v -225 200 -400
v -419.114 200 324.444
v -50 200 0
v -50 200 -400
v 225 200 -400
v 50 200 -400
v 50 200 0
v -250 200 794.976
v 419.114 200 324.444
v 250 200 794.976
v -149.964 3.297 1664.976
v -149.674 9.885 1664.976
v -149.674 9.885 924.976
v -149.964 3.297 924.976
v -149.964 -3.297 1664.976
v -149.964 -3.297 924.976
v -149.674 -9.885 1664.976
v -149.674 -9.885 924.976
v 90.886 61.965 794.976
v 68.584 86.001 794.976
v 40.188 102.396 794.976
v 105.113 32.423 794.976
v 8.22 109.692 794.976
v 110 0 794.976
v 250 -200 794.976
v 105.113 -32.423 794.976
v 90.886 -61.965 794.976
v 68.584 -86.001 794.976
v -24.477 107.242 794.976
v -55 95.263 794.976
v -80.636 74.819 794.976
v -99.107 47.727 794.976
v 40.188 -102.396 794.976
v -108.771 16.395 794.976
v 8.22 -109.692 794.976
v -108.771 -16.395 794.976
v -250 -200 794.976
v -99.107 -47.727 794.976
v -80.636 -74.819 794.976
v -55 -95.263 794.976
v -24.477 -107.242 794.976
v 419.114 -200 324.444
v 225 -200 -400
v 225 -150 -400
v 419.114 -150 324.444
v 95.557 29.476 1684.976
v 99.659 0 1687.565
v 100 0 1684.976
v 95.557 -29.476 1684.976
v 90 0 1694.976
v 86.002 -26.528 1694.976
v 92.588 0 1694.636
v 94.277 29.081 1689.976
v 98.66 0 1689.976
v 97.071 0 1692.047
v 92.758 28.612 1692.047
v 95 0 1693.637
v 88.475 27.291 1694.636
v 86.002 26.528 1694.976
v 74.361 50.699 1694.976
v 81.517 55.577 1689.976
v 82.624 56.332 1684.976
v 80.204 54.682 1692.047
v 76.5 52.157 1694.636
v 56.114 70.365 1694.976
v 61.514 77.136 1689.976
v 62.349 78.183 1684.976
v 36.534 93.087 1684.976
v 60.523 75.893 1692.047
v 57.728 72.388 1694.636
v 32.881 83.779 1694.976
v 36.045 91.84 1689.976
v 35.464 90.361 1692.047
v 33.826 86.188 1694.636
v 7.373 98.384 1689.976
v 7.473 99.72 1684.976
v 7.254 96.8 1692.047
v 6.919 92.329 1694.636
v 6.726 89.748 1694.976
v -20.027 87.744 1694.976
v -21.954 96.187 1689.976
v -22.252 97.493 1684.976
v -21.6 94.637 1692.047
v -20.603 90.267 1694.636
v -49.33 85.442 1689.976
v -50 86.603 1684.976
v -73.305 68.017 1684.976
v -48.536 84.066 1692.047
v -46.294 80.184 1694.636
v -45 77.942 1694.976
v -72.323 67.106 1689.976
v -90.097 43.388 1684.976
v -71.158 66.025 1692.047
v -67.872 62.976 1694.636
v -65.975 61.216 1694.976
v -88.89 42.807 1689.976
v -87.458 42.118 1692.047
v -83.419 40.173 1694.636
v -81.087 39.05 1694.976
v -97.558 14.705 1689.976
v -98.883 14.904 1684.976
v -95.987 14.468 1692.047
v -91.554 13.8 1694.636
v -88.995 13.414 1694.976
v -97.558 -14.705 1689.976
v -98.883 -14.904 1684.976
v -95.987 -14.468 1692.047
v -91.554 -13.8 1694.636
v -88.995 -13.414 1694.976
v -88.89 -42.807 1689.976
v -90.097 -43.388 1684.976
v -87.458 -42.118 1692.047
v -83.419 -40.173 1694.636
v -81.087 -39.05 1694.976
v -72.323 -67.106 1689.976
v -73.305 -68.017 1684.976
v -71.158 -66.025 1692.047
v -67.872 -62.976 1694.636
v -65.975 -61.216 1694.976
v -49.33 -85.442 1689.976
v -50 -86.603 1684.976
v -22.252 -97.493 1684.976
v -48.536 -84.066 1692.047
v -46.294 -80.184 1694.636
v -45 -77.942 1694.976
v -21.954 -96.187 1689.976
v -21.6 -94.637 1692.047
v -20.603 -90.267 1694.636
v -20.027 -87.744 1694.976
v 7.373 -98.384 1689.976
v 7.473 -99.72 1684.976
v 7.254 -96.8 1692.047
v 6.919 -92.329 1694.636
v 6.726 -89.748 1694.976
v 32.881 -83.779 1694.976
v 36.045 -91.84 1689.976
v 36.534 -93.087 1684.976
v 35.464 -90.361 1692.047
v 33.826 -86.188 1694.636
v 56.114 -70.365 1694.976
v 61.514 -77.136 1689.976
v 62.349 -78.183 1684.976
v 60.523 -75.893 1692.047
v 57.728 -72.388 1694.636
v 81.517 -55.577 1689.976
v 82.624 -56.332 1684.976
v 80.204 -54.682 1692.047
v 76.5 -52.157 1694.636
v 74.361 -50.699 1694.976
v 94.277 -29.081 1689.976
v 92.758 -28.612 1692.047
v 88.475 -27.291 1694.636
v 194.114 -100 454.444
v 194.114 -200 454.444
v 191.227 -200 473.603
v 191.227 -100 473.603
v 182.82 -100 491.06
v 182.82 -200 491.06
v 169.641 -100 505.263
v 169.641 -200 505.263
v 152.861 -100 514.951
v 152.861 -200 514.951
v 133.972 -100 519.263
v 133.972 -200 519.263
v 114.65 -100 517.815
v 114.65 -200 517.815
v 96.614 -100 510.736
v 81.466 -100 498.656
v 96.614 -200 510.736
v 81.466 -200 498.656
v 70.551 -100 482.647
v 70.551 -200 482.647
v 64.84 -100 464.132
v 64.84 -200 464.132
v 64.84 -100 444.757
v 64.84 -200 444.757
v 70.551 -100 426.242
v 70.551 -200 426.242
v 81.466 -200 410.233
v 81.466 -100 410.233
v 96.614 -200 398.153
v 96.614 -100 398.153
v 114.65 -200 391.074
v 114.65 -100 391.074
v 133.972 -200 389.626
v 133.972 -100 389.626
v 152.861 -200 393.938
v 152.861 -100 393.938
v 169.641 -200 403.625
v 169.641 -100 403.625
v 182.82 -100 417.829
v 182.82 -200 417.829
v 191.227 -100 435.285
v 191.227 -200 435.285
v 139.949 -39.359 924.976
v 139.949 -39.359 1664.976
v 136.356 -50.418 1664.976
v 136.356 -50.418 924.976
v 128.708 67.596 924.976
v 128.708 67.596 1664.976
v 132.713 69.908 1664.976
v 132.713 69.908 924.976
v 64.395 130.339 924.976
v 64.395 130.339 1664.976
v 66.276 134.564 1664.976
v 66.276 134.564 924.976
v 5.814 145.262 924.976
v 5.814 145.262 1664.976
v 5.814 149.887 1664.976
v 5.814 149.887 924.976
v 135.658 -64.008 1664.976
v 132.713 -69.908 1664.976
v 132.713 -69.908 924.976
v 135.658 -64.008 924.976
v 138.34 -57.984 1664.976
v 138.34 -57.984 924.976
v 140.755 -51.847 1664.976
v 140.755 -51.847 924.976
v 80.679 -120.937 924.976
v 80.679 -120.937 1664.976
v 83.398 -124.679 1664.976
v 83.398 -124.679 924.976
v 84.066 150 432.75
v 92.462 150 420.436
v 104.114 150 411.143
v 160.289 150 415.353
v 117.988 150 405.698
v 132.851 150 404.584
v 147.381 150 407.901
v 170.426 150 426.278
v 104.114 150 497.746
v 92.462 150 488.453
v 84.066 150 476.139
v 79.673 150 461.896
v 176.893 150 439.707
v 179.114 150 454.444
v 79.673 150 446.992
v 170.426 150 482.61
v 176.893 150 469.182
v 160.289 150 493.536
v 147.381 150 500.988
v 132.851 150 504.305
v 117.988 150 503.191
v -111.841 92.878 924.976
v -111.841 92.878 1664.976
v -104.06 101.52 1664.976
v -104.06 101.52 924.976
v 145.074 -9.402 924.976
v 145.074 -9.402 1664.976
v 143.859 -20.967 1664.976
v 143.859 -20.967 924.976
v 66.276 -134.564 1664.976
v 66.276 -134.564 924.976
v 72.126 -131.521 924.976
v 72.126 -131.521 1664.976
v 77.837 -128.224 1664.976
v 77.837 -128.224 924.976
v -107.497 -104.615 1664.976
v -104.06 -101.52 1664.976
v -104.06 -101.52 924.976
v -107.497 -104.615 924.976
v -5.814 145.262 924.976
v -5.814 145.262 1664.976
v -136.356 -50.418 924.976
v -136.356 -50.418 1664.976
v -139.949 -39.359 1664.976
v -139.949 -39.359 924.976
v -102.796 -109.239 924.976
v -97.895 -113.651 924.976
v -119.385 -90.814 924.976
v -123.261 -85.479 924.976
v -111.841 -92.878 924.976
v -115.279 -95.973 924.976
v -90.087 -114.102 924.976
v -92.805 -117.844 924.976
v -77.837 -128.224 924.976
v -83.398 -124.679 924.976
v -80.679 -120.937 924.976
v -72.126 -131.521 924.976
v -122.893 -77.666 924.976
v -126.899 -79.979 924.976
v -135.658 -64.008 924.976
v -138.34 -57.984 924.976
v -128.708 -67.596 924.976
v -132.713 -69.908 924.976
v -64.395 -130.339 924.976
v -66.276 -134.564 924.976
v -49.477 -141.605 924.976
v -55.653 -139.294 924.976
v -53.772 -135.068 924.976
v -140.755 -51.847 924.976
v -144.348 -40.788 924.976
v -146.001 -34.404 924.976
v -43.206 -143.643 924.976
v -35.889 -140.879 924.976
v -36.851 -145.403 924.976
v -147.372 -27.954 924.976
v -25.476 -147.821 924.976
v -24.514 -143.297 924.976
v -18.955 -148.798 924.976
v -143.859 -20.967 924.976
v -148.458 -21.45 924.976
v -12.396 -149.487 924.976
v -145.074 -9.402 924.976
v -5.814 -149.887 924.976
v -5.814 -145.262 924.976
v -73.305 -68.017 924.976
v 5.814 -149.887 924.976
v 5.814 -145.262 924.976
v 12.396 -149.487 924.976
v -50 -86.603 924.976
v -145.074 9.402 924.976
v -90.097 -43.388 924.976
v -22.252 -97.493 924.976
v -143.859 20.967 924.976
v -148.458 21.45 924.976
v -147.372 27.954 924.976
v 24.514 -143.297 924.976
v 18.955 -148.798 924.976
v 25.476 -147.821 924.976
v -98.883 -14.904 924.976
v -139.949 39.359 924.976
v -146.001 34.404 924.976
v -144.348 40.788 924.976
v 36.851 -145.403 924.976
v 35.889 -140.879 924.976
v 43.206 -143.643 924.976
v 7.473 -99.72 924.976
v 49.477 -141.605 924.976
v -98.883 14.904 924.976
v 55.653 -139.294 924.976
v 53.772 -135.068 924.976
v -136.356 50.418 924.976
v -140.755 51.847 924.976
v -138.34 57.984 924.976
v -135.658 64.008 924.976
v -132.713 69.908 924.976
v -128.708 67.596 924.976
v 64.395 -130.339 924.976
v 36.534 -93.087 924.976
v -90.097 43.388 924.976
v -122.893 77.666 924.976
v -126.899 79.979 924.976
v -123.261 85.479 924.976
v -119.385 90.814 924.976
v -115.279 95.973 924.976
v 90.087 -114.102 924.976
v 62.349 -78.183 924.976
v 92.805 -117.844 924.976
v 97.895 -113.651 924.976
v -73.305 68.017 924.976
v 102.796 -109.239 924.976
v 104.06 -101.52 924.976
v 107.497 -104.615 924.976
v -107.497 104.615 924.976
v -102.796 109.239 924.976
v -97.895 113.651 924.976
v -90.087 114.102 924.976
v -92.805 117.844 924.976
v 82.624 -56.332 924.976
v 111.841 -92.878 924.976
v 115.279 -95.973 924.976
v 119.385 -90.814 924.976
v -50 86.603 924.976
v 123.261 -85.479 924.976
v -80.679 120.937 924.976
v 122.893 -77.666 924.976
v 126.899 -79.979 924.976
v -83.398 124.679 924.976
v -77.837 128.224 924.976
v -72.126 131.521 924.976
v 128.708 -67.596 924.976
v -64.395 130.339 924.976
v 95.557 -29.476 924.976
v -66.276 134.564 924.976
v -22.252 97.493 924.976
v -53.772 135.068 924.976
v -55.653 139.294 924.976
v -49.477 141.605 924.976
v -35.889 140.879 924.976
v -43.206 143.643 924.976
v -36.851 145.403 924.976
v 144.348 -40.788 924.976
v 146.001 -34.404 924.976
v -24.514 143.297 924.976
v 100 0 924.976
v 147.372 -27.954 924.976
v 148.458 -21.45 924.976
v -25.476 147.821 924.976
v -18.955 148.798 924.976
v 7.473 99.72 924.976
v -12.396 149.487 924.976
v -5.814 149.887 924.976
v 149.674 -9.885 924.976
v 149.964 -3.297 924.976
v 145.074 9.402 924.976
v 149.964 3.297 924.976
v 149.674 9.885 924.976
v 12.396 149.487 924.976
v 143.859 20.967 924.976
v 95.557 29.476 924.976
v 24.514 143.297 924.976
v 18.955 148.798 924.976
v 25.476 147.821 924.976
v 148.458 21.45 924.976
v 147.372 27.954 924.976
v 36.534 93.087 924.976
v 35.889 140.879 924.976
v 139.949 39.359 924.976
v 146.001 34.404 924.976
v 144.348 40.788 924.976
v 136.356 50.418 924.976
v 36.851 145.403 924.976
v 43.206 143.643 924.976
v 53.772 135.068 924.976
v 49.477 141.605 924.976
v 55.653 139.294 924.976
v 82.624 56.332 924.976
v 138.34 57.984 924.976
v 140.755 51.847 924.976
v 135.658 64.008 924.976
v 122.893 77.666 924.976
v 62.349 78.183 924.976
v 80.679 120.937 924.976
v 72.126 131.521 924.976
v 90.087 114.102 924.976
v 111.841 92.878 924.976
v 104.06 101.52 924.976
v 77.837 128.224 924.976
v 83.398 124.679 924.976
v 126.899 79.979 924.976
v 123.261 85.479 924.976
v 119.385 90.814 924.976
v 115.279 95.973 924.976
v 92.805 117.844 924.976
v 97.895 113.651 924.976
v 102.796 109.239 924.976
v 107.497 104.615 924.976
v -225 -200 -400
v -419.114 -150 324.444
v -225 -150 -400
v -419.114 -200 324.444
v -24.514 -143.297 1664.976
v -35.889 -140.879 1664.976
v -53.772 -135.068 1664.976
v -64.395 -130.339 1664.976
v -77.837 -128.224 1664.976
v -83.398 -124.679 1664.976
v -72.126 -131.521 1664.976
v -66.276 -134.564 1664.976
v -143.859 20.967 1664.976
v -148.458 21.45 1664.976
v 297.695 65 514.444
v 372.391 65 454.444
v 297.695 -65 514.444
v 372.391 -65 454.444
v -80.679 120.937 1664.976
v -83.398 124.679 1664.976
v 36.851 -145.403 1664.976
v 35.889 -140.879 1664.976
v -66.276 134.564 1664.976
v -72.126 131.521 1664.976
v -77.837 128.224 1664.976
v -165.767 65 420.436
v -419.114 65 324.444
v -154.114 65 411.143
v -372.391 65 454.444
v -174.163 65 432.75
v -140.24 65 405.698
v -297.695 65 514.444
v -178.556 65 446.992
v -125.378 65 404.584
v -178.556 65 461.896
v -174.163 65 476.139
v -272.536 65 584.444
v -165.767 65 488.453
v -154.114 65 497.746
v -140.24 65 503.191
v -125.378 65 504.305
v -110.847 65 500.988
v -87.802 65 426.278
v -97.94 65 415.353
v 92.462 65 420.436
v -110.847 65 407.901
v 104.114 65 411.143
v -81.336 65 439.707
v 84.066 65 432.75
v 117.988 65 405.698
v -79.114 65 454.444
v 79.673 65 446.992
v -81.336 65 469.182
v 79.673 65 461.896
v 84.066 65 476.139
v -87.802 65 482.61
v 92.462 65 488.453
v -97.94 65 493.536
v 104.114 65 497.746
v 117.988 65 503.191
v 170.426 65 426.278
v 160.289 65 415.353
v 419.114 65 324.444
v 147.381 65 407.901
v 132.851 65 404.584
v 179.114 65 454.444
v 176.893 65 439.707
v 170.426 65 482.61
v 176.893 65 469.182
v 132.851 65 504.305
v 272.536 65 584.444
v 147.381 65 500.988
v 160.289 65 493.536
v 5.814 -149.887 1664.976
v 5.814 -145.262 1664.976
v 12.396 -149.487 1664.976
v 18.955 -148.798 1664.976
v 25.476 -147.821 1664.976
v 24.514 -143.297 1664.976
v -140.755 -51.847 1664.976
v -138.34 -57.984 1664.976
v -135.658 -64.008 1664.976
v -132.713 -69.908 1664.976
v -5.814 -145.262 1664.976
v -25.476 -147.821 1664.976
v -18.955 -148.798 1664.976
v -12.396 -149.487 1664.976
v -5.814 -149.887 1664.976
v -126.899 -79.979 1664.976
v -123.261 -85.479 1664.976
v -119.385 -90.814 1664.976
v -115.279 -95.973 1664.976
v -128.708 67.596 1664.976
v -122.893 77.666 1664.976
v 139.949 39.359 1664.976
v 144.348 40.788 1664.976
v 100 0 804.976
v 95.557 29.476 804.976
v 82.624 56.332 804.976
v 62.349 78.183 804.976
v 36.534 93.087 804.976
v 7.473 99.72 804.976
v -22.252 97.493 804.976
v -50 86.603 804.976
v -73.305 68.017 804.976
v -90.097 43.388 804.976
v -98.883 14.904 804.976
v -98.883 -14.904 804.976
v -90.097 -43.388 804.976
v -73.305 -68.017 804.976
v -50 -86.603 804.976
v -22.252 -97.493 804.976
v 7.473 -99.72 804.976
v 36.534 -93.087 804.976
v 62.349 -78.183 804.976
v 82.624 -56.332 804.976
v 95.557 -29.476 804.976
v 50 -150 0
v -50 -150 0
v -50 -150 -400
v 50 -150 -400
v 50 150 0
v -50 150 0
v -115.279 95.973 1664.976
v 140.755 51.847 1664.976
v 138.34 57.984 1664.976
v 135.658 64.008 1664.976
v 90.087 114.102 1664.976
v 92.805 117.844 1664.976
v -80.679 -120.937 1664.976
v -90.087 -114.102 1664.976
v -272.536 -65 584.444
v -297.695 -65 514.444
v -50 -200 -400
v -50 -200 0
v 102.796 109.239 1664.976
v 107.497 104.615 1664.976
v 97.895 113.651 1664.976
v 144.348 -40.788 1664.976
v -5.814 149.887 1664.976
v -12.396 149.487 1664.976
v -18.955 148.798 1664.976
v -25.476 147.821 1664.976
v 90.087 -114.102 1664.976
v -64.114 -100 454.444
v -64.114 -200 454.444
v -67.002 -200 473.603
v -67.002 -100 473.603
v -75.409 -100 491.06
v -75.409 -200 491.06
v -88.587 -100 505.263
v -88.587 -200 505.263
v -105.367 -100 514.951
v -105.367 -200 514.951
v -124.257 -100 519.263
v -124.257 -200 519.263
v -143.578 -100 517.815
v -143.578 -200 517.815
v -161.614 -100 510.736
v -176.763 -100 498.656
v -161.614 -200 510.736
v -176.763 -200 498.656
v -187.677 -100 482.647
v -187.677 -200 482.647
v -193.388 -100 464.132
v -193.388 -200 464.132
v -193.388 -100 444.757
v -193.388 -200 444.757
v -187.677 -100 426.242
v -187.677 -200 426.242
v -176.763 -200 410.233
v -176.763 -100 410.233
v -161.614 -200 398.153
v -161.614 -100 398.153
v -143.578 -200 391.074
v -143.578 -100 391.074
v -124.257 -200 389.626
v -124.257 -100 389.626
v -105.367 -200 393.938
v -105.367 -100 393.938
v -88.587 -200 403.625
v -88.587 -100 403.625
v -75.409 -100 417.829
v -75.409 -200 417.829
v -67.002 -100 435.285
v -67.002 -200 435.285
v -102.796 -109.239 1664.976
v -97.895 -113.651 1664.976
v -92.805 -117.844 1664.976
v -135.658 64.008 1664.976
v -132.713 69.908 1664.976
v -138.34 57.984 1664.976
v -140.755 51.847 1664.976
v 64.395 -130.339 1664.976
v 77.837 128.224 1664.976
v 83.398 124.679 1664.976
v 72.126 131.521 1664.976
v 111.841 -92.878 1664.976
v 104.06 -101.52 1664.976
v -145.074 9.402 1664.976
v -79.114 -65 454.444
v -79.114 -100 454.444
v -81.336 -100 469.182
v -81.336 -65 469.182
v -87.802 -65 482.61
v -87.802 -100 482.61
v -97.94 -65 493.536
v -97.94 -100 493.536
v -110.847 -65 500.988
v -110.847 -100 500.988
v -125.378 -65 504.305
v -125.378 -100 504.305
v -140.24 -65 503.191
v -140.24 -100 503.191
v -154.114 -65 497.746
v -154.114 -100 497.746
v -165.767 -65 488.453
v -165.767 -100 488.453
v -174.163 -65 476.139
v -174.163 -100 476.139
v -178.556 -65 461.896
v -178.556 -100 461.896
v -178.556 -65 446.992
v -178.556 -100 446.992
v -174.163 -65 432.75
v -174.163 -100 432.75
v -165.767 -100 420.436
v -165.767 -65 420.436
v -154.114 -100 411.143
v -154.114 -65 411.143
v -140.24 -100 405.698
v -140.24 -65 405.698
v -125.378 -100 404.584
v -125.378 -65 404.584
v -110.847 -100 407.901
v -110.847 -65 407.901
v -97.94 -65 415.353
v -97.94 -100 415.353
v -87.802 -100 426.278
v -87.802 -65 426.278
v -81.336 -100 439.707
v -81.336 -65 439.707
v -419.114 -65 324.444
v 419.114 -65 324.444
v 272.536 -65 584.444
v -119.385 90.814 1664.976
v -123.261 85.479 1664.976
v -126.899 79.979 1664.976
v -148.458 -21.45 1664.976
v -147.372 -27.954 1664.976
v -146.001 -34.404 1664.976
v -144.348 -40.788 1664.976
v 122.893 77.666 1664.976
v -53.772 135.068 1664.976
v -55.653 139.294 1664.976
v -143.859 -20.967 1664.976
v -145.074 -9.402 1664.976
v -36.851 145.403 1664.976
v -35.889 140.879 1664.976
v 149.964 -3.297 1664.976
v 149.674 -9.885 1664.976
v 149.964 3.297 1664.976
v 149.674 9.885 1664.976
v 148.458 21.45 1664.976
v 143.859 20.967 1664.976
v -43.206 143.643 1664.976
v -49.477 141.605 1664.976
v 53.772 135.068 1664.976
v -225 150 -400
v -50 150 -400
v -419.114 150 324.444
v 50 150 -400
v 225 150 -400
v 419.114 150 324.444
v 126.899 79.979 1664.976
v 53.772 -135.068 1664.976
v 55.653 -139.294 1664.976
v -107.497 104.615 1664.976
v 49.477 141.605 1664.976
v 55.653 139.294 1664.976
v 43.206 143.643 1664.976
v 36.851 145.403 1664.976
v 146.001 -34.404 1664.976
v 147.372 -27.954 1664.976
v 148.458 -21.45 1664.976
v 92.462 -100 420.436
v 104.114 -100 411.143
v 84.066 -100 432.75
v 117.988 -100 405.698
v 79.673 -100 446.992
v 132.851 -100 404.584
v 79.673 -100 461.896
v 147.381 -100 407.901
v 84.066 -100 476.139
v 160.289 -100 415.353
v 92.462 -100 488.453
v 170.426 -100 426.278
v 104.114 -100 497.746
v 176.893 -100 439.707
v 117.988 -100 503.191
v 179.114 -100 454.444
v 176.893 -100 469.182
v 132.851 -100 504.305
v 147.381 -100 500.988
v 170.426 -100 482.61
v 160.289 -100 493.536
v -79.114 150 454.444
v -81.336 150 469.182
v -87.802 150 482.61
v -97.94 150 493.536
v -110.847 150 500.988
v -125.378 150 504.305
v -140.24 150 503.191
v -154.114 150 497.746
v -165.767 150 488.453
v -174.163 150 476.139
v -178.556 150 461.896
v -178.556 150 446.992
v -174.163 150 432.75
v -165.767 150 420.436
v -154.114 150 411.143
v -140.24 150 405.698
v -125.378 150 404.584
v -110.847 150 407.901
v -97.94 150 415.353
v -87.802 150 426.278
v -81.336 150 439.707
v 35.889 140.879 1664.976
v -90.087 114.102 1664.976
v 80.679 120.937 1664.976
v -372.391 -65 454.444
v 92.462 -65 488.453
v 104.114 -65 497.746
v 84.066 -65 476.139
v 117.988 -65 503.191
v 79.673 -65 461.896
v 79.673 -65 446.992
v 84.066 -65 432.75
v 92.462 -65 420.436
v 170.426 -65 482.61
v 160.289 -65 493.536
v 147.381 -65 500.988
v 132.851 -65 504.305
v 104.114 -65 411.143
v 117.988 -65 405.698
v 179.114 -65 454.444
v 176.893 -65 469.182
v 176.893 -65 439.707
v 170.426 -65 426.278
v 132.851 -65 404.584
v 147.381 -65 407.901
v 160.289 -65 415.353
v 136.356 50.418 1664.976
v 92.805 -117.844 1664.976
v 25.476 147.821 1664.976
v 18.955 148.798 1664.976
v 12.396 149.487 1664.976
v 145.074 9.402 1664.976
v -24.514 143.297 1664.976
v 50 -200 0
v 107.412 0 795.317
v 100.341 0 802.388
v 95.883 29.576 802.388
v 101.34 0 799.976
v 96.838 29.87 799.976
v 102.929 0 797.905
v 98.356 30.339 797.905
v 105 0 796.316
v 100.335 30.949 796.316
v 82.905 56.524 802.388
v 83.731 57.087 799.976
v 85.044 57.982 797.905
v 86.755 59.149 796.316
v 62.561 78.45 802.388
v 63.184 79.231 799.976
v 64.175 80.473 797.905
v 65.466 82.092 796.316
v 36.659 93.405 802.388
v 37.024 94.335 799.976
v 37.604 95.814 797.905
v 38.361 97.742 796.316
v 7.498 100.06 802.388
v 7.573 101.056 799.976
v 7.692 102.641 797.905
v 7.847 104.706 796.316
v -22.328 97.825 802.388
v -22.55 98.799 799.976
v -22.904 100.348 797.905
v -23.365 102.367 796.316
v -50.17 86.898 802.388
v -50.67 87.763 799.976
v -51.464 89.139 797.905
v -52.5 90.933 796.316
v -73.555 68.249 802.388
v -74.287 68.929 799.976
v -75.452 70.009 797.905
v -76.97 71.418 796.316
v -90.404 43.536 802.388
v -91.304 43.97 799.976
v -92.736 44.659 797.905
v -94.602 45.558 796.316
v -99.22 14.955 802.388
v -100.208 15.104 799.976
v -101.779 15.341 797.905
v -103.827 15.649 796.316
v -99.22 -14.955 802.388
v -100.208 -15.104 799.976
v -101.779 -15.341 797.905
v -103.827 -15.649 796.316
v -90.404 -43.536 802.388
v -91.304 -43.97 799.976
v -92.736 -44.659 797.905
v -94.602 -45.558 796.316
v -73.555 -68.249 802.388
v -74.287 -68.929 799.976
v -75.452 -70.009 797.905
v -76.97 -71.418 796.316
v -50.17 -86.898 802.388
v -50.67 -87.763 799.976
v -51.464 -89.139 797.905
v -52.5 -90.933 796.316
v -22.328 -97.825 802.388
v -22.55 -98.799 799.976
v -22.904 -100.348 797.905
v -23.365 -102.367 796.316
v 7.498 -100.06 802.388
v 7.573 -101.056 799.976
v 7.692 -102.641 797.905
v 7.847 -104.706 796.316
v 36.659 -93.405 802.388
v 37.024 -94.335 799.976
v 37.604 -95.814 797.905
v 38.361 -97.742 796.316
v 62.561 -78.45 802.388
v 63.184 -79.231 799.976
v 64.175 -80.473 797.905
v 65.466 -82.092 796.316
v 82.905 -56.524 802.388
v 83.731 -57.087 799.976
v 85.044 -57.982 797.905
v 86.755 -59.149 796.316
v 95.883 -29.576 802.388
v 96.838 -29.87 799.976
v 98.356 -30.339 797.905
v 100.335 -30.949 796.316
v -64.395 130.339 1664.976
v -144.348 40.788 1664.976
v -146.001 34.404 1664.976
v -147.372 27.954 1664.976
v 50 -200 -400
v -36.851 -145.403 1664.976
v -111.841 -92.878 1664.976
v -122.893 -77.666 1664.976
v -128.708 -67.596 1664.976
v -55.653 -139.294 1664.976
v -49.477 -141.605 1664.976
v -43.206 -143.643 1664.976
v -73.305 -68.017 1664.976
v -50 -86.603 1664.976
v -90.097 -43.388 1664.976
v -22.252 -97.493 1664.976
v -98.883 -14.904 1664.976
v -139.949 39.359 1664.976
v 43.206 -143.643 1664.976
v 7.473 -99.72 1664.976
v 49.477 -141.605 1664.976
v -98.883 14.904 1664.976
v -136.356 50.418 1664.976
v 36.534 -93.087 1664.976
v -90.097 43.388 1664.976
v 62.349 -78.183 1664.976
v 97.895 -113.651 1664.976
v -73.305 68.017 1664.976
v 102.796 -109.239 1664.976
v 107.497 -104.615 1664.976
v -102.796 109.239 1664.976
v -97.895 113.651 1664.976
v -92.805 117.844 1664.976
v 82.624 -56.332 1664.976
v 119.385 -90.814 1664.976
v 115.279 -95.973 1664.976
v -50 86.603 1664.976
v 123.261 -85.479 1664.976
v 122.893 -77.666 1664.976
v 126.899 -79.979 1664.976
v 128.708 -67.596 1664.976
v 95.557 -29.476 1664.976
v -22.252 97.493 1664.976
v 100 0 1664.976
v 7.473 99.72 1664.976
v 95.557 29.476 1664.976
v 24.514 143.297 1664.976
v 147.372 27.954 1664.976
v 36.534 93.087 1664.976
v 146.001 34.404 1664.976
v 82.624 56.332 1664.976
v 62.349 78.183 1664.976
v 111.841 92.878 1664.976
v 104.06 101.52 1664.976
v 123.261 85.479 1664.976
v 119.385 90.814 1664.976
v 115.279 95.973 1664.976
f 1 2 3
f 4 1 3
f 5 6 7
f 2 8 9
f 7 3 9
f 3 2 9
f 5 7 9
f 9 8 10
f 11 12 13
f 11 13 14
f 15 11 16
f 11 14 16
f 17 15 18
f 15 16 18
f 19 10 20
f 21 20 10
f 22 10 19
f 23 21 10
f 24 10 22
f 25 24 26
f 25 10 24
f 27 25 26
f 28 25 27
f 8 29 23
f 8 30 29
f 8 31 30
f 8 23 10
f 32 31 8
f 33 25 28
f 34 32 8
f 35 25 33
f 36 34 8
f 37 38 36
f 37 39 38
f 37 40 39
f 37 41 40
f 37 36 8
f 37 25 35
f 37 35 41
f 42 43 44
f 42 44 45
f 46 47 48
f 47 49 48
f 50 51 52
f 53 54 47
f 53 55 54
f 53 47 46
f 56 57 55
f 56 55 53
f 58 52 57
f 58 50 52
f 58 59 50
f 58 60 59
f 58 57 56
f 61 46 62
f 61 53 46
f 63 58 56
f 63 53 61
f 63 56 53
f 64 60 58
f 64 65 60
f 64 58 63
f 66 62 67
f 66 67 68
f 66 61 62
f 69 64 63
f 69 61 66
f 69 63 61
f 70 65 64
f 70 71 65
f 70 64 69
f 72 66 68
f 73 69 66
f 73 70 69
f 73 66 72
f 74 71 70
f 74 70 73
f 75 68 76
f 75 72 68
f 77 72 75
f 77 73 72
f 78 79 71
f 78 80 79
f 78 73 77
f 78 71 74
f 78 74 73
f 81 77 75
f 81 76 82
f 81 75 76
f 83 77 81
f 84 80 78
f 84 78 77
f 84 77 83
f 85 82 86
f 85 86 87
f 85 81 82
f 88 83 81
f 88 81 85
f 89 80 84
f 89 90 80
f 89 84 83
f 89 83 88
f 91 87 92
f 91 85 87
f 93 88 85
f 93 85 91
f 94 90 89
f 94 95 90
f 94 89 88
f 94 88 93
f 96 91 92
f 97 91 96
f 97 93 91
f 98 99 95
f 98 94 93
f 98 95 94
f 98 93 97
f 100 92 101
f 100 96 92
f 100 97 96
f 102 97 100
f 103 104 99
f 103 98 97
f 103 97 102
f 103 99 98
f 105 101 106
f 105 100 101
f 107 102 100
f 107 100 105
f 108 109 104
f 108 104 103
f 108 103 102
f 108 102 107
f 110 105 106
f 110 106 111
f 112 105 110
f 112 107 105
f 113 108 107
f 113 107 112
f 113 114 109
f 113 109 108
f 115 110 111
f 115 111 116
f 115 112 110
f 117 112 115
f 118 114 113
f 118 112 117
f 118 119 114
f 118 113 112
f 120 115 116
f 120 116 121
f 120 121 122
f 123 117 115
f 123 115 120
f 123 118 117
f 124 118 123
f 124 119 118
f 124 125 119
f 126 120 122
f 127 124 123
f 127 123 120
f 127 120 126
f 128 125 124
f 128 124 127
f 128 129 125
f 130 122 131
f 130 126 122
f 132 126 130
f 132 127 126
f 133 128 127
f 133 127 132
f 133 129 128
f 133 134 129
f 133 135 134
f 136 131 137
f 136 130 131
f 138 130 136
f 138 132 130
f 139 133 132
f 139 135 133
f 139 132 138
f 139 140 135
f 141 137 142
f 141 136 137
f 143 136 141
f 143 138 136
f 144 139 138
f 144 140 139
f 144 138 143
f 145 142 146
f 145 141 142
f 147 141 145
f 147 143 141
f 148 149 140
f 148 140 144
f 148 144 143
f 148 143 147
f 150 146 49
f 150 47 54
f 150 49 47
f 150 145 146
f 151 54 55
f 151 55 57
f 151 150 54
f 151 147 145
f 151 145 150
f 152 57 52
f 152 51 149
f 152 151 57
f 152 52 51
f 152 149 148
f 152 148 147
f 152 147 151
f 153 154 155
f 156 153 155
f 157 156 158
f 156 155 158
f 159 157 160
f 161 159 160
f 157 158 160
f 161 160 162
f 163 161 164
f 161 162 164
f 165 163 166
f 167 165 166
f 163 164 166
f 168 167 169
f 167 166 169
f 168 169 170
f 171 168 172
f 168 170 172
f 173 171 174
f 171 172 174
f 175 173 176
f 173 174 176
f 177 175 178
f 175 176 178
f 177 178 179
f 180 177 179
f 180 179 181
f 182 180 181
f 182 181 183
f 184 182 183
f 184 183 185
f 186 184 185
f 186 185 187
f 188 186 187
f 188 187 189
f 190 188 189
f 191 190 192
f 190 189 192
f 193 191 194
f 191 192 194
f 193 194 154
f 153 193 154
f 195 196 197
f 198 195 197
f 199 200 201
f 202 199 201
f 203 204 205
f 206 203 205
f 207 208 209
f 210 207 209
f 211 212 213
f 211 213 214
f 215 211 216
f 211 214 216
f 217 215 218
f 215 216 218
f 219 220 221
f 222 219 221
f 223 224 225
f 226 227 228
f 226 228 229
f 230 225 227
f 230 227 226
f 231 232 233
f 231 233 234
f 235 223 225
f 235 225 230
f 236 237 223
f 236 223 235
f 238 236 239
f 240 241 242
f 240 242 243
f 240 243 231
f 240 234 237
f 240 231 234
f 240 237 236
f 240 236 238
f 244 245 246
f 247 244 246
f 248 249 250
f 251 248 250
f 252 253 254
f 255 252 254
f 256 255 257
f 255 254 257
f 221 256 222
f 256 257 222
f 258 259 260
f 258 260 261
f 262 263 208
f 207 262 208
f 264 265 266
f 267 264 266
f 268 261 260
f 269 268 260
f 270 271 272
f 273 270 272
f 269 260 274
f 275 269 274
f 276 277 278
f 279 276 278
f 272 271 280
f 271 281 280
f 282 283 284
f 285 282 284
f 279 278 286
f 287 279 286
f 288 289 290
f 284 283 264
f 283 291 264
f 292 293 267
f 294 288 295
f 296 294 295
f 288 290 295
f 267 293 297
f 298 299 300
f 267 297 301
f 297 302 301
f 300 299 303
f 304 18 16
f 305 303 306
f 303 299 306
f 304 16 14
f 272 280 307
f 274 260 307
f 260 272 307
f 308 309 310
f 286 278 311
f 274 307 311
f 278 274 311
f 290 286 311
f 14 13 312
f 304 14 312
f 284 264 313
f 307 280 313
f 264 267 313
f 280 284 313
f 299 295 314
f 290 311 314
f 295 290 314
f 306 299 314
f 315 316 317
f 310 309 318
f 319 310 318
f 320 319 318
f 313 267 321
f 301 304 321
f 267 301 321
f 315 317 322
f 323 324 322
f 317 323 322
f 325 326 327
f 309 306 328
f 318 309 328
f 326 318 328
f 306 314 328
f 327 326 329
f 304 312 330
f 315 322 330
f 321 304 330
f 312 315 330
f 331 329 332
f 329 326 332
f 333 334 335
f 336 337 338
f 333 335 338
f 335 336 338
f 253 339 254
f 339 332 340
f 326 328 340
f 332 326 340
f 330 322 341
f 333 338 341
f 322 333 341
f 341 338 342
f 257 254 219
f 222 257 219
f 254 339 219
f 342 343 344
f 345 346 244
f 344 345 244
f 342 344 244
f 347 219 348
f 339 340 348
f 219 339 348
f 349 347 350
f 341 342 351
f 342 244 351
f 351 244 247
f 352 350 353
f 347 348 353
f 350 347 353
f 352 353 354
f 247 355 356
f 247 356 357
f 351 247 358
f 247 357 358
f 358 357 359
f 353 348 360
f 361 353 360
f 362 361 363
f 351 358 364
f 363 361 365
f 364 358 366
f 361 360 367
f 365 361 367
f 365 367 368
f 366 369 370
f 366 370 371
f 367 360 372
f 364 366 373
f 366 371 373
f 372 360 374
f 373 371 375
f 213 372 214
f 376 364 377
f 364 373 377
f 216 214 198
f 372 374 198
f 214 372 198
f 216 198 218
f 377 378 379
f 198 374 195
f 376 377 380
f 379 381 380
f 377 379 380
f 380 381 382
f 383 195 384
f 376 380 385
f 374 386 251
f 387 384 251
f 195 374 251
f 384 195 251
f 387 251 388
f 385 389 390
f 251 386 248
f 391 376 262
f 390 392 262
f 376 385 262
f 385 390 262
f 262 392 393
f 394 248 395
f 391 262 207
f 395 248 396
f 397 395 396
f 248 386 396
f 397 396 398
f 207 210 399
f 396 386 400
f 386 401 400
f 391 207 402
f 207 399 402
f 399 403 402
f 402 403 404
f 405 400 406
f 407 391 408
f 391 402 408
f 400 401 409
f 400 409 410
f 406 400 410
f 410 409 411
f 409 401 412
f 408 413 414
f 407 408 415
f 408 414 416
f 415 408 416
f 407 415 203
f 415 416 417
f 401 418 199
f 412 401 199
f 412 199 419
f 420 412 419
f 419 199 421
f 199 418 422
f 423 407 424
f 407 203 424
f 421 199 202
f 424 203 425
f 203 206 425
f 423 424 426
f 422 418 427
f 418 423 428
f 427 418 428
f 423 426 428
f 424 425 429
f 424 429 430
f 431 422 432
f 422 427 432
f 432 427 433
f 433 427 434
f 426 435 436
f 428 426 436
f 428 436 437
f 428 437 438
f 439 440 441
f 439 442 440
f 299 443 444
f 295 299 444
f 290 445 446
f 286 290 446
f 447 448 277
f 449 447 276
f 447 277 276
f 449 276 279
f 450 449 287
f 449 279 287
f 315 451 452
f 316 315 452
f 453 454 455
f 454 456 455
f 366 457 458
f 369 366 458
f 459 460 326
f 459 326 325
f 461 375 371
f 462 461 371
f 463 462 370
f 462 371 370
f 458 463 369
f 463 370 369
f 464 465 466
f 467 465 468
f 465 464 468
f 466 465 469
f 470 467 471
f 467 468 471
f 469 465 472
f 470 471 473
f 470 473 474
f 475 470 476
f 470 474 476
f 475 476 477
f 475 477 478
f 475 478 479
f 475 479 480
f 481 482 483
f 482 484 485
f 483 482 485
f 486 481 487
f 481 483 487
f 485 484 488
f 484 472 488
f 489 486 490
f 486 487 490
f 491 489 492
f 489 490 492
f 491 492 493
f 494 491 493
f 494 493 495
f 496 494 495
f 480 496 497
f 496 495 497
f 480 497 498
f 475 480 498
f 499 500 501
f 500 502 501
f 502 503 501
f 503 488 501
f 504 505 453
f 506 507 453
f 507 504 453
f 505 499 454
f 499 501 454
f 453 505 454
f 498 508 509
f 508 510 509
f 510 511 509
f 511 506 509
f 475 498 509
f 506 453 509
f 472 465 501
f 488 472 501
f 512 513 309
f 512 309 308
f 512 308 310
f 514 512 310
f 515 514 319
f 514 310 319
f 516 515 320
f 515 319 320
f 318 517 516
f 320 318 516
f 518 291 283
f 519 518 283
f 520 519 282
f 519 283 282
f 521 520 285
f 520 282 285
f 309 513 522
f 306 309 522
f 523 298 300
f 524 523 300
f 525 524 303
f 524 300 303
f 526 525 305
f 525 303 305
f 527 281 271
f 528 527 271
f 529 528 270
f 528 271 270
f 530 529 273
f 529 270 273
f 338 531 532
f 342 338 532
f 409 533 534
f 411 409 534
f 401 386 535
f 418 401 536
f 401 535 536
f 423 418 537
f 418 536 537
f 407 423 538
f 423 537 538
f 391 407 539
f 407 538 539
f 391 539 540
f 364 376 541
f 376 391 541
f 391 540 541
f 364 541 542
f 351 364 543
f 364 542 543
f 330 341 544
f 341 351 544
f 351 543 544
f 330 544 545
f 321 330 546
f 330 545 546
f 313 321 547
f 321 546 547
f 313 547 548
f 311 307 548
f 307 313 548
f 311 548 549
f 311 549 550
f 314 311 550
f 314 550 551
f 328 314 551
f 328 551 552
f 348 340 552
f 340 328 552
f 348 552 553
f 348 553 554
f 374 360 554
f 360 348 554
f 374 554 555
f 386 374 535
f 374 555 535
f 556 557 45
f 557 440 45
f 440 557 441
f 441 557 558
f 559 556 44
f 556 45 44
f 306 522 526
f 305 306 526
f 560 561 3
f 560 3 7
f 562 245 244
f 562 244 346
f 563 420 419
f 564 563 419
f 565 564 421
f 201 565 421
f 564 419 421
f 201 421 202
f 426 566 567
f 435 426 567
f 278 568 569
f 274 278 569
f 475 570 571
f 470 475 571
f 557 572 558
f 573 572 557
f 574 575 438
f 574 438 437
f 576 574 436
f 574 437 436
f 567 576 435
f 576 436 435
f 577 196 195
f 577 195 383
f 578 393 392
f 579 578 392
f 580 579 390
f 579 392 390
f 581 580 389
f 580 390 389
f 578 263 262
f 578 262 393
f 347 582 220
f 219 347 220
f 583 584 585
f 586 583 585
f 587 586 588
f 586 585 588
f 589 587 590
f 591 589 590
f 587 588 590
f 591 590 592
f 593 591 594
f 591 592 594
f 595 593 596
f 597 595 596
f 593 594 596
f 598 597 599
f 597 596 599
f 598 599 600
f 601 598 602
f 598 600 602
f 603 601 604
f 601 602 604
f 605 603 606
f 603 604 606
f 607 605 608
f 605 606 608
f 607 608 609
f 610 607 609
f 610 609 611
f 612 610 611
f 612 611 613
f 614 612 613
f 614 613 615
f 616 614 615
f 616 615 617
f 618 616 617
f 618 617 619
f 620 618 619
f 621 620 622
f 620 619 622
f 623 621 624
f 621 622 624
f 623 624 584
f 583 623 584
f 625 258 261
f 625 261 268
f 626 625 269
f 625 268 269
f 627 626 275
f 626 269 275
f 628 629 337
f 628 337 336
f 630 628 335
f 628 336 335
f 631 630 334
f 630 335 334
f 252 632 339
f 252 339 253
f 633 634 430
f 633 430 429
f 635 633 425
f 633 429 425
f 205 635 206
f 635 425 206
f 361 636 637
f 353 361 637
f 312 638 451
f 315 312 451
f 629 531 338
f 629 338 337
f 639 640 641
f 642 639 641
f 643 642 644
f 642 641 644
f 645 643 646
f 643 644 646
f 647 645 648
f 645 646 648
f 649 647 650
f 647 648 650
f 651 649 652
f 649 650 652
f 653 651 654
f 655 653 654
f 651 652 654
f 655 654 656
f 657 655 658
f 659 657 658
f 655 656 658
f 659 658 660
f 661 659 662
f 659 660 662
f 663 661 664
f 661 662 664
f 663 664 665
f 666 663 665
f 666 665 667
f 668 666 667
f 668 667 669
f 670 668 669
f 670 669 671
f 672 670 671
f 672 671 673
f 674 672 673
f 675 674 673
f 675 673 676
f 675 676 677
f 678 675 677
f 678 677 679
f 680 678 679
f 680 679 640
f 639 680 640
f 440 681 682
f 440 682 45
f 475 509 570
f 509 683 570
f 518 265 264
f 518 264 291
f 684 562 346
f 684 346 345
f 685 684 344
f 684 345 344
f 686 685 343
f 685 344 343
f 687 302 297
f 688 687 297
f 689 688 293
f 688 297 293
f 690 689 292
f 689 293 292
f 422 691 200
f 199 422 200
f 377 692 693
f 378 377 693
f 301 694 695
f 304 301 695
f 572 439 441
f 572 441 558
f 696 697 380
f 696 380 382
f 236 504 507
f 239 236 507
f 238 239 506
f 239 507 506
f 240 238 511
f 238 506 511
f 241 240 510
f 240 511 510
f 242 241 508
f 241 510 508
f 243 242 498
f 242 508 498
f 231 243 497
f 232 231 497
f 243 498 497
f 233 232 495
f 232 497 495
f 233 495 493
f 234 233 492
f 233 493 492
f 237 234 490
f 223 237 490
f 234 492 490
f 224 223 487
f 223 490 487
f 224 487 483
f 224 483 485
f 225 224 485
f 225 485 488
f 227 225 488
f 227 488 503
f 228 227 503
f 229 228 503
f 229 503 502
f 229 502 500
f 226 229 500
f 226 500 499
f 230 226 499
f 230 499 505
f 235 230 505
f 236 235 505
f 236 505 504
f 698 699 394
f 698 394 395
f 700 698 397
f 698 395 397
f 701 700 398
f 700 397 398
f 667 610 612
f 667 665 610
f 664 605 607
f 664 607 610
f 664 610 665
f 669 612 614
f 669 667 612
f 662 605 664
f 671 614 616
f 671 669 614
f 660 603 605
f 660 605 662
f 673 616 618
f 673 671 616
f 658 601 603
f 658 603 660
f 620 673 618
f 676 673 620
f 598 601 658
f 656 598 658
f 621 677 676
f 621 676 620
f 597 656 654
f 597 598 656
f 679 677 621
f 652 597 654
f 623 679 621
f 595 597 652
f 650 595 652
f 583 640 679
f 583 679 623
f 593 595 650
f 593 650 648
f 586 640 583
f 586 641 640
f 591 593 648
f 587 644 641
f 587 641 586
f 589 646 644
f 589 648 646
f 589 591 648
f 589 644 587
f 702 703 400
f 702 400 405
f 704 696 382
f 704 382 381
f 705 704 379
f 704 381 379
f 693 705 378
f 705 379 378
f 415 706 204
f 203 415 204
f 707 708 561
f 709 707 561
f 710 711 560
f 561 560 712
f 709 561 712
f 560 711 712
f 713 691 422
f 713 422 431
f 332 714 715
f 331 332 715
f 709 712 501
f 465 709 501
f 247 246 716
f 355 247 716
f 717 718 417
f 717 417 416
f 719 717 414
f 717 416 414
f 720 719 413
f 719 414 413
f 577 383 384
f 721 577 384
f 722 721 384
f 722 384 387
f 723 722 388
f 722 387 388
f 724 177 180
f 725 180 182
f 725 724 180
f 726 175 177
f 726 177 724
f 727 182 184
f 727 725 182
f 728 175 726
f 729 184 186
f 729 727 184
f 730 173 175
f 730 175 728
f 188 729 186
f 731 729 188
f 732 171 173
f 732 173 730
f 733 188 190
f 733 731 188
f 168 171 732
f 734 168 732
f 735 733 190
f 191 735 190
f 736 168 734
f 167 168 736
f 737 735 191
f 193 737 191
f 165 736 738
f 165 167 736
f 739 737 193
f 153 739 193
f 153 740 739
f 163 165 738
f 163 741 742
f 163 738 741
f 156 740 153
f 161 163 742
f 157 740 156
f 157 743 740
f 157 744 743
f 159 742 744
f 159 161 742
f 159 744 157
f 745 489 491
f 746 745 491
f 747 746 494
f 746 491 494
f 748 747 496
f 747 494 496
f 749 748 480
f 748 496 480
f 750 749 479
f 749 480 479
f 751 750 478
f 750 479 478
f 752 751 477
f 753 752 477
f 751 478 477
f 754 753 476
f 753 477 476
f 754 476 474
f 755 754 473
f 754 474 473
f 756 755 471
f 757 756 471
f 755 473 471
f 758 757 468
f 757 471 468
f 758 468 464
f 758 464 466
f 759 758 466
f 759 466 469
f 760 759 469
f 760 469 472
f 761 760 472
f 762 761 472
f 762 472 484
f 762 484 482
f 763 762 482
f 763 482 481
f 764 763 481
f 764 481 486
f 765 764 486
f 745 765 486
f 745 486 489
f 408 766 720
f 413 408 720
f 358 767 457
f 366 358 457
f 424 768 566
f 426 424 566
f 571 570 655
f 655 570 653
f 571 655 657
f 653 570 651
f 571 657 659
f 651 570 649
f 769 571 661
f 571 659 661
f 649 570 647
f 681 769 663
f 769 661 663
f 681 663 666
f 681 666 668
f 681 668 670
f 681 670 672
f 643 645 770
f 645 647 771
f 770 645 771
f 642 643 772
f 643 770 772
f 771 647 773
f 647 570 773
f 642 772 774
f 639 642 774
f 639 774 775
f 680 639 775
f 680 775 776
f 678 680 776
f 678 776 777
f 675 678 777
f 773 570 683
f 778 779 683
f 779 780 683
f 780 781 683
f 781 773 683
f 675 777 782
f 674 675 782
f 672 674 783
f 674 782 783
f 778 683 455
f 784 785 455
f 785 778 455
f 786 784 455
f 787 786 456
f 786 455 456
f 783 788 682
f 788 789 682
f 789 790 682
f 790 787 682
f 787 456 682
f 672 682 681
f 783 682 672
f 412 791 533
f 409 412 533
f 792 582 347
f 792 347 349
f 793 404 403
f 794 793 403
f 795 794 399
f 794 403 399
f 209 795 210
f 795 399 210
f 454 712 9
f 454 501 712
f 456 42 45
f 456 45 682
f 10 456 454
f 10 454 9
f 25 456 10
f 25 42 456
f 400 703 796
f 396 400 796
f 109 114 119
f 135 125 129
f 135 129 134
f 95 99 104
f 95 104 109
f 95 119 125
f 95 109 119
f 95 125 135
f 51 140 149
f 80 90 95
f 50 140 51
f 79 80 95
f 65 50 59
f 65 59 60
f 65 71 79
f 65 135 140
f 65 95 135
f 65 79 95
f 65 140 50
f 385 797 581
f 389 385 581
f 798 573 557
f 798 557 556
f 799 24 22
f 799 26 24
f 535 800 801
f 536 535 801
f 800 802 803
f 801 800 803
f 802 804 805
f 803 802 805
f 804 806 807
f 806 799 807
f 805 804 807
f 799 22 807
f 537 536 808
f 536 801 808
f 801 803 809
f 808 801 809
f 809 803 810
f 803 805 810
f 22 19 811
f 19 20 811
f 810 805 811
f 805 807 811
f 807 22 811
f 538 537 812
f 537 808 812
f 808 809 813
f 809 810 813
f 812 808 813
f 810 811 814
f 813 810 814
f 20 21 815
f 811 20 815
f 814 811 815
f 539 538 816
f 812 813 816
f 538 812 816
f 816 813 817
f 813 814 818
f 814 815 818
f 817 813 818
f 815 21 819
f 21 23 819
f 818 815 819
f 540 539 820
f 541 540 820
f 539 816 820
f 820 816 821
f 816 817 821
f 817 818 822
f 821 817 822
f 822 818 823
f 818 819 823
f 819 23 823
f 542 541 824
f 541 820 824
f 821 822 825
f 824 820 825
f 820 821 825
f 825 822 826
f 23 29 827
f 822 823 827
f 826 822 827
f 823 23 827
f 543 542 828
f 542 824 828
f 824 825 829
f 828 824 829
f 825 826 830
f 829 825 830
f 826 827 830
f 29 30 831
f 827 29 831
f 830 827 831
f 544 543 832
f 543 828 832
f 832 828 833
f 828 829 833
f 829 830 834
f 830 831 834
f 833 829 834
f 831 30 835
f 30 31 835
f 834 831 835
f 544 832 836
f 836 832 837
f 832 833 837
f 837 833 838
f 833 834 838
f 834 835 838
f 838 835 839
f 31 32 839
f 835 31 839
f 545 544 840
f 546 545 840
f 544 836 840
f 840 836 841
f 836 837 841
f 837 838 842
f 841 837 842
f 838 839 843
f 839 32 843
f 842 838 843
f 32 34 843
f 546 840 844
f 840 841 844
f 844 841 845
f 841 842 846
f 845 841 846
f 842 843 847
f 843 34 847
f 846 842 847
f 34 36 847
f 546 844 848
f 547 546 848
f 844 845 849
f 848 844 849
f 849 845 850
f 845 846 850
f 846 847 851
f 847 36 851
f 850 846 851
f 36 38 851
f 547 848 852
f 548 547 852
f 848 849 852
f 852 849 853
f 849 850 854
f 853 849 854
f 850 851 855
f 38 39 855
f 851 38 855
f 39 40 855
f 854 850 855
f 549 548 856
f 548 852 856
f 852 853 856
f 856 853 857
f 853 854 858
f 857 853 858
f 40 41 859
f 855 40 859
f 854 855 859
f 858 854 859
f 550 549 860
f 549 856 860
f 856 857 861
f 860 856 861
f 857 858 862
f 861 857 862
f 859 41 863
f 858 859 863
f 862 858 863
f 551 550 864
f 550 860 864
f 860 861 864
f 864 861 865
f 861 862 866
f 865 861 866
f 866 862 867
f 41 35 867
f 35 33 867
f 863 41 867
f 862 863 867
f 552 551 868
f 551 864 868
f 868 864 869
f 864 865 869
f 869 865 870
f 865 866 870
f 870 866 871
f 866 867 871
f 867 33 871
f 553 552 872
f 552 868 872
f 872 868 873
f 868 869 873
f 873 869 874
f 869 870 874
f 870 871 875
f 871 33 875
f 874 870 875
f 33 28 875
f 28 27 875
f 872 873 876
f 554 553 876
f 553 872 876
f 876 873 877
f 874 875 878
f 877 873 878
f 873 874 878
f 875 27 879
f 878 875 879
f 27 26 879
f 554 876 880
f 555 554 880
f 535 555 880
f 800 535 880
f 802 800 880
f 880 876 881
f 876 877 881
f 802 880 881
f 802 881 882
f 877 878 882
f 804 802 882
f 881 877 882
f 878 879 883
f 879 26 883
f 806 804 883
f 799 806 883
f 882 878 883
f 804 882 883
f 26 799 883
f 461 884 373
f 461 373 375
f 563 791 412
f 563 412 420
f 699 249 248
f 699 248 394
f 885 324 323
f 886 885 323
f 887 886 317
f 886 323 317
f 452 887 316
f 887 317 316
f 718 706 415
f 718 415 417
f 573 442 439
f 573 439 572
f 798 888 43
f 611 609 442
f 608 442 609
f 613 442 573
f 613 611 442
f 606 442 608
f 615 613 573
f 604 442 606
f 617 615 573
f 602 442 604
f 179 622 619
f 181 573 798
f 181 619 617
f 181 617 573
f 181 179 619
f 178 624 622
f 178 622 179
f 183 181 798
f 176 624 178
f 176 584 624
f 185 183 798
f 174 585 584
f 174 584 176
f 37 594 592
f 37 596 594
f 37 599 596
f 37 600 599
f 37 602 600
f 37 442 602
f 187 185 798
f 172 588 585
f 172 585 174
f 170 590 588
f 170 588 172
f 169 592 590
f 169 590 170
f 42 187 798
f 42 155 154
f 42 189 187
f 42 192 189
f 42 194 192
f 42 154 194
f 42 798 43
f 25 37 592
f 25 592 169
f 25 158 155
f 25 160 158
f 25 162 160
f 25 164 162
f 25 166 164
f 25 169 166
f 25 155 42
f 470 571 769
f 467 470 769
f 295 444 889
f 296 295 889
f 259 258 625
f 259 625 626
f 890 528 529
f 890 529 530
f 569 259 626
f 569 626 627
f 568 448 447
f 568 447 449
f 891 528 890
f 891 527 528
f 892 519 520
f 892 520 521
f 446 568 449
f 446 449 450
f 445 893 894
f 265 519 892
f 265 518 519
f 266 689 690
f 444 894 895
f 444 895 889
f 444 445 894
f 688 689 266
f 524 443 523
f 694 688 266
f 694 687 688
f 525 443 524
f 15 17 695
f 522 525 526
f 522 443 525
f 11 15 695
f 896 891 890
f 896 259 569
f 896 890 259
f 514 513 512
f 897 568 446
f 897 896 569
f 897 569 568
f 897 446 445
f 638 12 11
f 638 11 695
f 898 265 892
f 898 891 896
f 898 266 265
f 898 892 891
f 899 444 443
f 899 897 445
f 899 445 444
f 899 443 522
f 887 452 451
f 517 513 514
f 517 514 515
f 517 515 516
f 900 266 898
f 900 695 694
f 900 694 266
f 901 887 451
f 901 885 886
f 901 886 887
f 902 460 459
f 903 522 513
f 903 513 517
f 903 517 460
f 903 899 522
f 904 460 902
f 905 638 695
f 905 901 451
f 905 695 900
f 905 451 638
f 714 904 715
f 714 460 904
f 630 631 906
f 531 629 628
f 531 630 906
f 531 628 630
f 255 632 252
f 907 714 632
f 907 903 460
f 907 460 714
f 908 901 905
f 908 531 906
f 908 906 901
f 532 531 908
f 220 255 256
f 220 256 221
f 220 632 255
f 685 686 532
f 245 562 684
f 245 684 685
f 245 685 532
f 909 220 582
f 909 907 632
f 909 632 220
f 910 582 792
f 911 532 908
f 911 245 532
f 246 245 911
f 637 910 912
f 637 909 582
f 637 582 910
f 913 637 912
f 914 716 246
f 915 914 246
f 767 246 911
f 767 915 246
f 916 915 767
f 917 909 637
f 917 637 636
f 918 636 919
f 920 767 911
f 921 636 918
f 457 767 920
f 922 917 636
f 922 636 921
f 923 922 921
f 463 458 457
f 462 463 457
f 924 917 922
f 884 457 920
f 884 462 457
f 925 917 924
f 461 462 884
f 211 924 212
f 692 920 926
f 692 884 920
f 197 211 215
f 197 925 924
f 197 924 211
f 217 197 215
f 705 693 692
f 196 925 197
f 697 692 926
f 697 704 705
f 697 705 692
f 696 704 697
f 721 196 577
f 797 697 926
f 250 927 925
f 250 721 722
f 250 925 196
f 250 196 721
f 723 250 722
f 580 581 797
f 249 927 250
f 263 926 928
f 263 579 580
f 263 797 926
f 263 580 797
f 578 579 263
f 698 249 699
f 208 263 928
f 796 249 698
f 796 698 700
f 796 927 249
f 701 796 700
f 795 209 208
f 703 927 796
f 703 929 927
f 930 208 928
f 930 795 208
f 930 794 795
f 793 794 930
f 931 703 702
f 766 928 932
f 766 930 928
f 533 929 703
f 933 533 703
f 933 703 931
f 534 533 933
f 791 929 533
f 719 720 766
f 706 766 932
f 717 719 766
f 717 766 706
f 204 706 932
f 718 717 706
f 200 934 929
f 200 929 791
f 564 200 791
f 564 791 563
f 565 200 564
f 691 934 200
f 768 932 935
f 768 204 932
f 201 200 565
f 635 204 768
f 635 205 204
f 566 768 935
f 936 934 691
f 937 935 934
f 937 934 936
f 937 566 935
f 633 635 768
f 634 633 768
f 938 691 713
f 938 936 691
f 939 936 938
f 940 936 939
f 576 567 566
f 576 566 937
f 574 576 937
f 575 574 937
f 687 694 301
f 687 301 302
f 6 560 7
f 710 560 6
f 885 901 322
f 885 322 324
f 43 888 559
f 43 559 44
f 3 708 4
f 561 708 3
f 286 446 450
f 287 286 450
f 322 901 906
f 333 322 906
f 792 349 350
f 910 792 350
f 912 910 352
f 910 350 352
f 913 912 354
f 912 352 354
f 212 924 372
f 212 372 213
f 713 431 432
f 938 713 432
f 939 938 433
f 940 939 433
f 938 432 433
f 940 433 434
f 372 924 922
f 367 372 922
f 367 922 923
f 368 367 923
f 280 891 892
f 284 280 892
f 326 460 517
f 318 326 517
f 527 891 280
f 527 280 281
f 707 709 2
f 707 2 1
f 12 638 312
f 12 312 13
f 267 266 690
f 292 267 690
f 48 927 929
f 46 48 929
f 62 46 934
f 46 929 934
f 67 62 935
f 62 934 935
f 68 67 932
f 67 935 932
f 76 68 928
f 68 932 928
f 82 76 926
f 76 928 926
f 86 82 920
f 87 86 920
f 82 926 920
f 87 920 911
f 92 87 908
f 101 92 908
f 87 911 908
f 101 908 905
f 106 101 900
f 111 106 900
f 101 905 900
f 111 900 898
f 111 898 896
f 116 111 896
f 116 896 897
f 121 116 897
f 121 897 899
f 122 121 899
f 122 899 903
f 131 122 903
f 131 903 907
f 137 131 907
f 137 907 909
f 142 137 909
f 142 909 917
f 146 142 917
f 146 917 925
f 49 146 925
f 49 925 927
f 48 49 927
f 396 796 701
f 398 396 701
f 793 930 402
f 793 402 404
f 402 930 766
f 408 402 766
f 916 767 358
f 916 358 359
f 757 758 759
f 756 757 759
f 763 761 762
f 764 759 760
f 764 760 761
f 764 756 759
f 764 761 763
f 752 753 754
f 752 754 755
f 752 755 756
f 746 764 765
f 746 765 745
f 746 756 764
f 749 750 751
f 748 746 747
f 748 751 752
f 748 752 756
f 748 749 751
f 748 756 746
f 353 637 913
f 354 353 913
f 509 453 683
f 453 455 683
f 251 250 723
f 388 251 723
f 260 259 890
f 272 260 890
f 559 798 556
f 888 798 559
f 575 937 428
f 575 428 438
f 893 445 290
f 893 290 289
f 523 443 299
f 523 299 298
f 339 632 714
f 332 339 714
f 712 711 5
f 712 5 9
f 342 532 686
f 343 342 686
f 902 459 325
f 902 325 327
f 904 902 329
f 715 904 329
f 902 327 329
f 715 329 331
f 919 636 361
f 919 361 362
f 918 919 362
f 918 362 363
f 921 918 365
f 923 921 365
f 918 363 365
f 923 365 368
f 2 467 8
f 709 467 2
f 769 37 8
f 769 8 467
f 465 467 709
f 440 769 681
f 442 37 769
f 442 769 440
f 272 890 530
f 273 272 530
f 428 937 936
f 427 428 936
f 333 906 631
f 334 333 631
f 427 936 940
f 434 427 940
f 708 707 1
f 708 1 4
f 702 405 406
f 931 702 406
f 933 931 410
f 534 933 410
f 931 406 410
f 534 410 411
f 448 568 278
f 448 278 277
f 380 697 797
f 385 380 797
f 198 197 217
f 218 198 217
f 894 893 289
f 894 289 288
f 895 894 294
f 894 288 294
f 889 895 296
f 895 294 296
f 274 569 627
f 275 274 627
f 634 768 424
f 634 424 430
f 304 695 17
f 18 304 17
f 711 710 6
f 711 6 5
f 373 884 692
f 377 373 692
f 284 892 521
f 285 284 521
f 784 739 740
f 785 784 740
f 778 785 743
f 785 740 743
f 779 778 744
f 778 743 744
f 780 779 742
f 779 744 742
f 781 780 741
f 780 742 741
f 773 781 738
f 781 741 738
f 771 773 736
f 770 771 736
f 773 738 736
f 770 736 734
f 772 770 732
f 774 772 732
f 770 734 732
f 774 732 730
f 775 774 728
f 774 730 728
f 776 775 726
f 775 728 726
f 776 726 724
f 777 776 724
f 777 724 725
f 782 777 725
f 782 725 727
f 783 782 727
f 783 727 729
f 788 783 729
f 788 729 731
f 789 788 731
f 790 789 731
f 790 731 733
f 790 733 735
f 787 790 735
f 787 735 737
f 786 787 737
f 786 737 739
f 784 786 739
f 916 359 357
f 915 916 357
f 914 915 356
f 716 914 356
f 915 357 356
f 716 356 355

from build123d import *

# Parameters (mm, degrees)
F1_DEPTH         = 200
F2_R             = 100
F3_DEPTH         = 900
F5_R             = 150
F6_DEPTH         = 740
F8_DEPTH         = 580
F9_R             = 65
F9_R_2           = 50
F10_DEPTH        = 100
F11_DEPTH        = 350
F13_DEPTH        = 65
F14_R            = 10
F15_W            = 11.6287115961
F15_H            = 9.4758689404
F16_DEPTH        = 740
F16_COPIES_COUNT = 30


# Not quite as in the source:
# - a pattern or mirror of a feature is missing from the dataset's text; its kind, count and spacing are read off the source's solid


with BuildPart() as f1:
    # F0 (on Front) → F1 (new body, symmetric)
    with BuildSketch(Plane.XZ):
        Polygon((250, 794.9763654469), (-250, 794.9763654469), (-419.1142838269, 324.4443697168), (-225, -400), (-50, -400), (-50, 0), (0, 0), (50, 0), (50, -400), (225, -400), (419.1142838269, 324.4443697168), align=None)
    extrude(amount=F1_DEPTH, both=True)

    # F2 (on face) → F3 (join)
    with BuildSketch(Plane.XY.offset(794.9763654469)):
        Circle(F2_R)
    extrude(amount=F3_DEPTH)

    # F5 (on offset) → F6 (join)
    with BuildSketch(Plane.XY.offset(924.9763654469)):
        Circle(F5_R)
    extrude(amount=F6_DEPTH)

    # F7 (on Right) → F8 (cut, symmetric)
    with BuildSketch(Plane.YZ):
        Polygon((-150, 324.4443697168), (-150, -400), (150, -400), (150, 324.4443697168), (65, 324.4443697168), (65, 454.4443697168), (-65, 454.4443697168), (-65, 324.4443697168), align=None)
    extrude(amount=F8_DEPTH, both=True, mode=Mode.SUBTRACT)

    # F9 (on face) → F10 (cut)
    with BuildSketch(Plane.XZ.offset(200)):
        with Locations((-129.1142838269, 454.4443697168)):
            Circle(F9_R)
        with Locations((-129.1142838269, 454.4443697168)):
            Circle(F9_R_2, mode=Mode.SUBTRACT)
        with Locations((129.1142838269, 454.4443697168)):
            Circle(F9_R)
        with Locations((129.1142838269, 454.4443697168)):
            Circle(F9_R_2, mode=Mode.SUBTRACT)
    extrude(amount=-F10_DEPTH, mode=Mode.SUBTRACT)

    # F11 (cut): faces of the model
    f11_faces = [f1.faces().sort_by_distance(p)[0] for p in [
        (-129.1142838269, -200, 454.4443697168),
        (129.1142838269, -200, 454.4443697168),
    ]]
    extrude(f11_faces, amount=-F11_DEPTH, mode=Mode.SUBTRACT)

    # F12 (on Front) → F13 (cut, symmetric)
    with BuildSketch(Plane.XZ):
        Polygon((272.5361245925, 584.4443697168), (-272.5361245925, 584.4443697168), (-297.6948810114, 514.4443697168), (-372.3908790489, 454.4443697168), (-419.1142838269, 324.4443697168), (419.1142838269, 324.4443697168), (372.3908790489, 454.4443697168), (297.6948810114, 514.4443697168), align=None)
    extrude(amount=F13_DEPTH, both=True, mode=Mode.SUBTRACT)

    # F14
    f14_edges = [f1.edges().sort_by_distance(p)[0] for p in [
        (-100, 0, 1694.976365),
        (-100, 0, 794.976365),
    ]]
    fillet(f14_edges, radius=F14_R)

    # F15 (on face) → F16 (cut, through all)
    with BuildSketch(Plane.XY.offset(1664.9763654469)):
        with Locations((0, 150)):
            Rectangle(F15_W, F15_H)
    f16 = extrude(amount=-F16_DEPTH, mode=Mode.SUBTRACT)

    # F16_copies: F16 ×30 about axis
    f16_copies_axis = Axis((0, 0, 0), (0, 0, 1))
    for i in range(1, F16_COPIES_COUNT):
        add(f16.rotate(f16_copies_axis, i * 360 / F16_COPIES_COUNT), mode=Mode.SUBTRACT)


solid = f1.part
